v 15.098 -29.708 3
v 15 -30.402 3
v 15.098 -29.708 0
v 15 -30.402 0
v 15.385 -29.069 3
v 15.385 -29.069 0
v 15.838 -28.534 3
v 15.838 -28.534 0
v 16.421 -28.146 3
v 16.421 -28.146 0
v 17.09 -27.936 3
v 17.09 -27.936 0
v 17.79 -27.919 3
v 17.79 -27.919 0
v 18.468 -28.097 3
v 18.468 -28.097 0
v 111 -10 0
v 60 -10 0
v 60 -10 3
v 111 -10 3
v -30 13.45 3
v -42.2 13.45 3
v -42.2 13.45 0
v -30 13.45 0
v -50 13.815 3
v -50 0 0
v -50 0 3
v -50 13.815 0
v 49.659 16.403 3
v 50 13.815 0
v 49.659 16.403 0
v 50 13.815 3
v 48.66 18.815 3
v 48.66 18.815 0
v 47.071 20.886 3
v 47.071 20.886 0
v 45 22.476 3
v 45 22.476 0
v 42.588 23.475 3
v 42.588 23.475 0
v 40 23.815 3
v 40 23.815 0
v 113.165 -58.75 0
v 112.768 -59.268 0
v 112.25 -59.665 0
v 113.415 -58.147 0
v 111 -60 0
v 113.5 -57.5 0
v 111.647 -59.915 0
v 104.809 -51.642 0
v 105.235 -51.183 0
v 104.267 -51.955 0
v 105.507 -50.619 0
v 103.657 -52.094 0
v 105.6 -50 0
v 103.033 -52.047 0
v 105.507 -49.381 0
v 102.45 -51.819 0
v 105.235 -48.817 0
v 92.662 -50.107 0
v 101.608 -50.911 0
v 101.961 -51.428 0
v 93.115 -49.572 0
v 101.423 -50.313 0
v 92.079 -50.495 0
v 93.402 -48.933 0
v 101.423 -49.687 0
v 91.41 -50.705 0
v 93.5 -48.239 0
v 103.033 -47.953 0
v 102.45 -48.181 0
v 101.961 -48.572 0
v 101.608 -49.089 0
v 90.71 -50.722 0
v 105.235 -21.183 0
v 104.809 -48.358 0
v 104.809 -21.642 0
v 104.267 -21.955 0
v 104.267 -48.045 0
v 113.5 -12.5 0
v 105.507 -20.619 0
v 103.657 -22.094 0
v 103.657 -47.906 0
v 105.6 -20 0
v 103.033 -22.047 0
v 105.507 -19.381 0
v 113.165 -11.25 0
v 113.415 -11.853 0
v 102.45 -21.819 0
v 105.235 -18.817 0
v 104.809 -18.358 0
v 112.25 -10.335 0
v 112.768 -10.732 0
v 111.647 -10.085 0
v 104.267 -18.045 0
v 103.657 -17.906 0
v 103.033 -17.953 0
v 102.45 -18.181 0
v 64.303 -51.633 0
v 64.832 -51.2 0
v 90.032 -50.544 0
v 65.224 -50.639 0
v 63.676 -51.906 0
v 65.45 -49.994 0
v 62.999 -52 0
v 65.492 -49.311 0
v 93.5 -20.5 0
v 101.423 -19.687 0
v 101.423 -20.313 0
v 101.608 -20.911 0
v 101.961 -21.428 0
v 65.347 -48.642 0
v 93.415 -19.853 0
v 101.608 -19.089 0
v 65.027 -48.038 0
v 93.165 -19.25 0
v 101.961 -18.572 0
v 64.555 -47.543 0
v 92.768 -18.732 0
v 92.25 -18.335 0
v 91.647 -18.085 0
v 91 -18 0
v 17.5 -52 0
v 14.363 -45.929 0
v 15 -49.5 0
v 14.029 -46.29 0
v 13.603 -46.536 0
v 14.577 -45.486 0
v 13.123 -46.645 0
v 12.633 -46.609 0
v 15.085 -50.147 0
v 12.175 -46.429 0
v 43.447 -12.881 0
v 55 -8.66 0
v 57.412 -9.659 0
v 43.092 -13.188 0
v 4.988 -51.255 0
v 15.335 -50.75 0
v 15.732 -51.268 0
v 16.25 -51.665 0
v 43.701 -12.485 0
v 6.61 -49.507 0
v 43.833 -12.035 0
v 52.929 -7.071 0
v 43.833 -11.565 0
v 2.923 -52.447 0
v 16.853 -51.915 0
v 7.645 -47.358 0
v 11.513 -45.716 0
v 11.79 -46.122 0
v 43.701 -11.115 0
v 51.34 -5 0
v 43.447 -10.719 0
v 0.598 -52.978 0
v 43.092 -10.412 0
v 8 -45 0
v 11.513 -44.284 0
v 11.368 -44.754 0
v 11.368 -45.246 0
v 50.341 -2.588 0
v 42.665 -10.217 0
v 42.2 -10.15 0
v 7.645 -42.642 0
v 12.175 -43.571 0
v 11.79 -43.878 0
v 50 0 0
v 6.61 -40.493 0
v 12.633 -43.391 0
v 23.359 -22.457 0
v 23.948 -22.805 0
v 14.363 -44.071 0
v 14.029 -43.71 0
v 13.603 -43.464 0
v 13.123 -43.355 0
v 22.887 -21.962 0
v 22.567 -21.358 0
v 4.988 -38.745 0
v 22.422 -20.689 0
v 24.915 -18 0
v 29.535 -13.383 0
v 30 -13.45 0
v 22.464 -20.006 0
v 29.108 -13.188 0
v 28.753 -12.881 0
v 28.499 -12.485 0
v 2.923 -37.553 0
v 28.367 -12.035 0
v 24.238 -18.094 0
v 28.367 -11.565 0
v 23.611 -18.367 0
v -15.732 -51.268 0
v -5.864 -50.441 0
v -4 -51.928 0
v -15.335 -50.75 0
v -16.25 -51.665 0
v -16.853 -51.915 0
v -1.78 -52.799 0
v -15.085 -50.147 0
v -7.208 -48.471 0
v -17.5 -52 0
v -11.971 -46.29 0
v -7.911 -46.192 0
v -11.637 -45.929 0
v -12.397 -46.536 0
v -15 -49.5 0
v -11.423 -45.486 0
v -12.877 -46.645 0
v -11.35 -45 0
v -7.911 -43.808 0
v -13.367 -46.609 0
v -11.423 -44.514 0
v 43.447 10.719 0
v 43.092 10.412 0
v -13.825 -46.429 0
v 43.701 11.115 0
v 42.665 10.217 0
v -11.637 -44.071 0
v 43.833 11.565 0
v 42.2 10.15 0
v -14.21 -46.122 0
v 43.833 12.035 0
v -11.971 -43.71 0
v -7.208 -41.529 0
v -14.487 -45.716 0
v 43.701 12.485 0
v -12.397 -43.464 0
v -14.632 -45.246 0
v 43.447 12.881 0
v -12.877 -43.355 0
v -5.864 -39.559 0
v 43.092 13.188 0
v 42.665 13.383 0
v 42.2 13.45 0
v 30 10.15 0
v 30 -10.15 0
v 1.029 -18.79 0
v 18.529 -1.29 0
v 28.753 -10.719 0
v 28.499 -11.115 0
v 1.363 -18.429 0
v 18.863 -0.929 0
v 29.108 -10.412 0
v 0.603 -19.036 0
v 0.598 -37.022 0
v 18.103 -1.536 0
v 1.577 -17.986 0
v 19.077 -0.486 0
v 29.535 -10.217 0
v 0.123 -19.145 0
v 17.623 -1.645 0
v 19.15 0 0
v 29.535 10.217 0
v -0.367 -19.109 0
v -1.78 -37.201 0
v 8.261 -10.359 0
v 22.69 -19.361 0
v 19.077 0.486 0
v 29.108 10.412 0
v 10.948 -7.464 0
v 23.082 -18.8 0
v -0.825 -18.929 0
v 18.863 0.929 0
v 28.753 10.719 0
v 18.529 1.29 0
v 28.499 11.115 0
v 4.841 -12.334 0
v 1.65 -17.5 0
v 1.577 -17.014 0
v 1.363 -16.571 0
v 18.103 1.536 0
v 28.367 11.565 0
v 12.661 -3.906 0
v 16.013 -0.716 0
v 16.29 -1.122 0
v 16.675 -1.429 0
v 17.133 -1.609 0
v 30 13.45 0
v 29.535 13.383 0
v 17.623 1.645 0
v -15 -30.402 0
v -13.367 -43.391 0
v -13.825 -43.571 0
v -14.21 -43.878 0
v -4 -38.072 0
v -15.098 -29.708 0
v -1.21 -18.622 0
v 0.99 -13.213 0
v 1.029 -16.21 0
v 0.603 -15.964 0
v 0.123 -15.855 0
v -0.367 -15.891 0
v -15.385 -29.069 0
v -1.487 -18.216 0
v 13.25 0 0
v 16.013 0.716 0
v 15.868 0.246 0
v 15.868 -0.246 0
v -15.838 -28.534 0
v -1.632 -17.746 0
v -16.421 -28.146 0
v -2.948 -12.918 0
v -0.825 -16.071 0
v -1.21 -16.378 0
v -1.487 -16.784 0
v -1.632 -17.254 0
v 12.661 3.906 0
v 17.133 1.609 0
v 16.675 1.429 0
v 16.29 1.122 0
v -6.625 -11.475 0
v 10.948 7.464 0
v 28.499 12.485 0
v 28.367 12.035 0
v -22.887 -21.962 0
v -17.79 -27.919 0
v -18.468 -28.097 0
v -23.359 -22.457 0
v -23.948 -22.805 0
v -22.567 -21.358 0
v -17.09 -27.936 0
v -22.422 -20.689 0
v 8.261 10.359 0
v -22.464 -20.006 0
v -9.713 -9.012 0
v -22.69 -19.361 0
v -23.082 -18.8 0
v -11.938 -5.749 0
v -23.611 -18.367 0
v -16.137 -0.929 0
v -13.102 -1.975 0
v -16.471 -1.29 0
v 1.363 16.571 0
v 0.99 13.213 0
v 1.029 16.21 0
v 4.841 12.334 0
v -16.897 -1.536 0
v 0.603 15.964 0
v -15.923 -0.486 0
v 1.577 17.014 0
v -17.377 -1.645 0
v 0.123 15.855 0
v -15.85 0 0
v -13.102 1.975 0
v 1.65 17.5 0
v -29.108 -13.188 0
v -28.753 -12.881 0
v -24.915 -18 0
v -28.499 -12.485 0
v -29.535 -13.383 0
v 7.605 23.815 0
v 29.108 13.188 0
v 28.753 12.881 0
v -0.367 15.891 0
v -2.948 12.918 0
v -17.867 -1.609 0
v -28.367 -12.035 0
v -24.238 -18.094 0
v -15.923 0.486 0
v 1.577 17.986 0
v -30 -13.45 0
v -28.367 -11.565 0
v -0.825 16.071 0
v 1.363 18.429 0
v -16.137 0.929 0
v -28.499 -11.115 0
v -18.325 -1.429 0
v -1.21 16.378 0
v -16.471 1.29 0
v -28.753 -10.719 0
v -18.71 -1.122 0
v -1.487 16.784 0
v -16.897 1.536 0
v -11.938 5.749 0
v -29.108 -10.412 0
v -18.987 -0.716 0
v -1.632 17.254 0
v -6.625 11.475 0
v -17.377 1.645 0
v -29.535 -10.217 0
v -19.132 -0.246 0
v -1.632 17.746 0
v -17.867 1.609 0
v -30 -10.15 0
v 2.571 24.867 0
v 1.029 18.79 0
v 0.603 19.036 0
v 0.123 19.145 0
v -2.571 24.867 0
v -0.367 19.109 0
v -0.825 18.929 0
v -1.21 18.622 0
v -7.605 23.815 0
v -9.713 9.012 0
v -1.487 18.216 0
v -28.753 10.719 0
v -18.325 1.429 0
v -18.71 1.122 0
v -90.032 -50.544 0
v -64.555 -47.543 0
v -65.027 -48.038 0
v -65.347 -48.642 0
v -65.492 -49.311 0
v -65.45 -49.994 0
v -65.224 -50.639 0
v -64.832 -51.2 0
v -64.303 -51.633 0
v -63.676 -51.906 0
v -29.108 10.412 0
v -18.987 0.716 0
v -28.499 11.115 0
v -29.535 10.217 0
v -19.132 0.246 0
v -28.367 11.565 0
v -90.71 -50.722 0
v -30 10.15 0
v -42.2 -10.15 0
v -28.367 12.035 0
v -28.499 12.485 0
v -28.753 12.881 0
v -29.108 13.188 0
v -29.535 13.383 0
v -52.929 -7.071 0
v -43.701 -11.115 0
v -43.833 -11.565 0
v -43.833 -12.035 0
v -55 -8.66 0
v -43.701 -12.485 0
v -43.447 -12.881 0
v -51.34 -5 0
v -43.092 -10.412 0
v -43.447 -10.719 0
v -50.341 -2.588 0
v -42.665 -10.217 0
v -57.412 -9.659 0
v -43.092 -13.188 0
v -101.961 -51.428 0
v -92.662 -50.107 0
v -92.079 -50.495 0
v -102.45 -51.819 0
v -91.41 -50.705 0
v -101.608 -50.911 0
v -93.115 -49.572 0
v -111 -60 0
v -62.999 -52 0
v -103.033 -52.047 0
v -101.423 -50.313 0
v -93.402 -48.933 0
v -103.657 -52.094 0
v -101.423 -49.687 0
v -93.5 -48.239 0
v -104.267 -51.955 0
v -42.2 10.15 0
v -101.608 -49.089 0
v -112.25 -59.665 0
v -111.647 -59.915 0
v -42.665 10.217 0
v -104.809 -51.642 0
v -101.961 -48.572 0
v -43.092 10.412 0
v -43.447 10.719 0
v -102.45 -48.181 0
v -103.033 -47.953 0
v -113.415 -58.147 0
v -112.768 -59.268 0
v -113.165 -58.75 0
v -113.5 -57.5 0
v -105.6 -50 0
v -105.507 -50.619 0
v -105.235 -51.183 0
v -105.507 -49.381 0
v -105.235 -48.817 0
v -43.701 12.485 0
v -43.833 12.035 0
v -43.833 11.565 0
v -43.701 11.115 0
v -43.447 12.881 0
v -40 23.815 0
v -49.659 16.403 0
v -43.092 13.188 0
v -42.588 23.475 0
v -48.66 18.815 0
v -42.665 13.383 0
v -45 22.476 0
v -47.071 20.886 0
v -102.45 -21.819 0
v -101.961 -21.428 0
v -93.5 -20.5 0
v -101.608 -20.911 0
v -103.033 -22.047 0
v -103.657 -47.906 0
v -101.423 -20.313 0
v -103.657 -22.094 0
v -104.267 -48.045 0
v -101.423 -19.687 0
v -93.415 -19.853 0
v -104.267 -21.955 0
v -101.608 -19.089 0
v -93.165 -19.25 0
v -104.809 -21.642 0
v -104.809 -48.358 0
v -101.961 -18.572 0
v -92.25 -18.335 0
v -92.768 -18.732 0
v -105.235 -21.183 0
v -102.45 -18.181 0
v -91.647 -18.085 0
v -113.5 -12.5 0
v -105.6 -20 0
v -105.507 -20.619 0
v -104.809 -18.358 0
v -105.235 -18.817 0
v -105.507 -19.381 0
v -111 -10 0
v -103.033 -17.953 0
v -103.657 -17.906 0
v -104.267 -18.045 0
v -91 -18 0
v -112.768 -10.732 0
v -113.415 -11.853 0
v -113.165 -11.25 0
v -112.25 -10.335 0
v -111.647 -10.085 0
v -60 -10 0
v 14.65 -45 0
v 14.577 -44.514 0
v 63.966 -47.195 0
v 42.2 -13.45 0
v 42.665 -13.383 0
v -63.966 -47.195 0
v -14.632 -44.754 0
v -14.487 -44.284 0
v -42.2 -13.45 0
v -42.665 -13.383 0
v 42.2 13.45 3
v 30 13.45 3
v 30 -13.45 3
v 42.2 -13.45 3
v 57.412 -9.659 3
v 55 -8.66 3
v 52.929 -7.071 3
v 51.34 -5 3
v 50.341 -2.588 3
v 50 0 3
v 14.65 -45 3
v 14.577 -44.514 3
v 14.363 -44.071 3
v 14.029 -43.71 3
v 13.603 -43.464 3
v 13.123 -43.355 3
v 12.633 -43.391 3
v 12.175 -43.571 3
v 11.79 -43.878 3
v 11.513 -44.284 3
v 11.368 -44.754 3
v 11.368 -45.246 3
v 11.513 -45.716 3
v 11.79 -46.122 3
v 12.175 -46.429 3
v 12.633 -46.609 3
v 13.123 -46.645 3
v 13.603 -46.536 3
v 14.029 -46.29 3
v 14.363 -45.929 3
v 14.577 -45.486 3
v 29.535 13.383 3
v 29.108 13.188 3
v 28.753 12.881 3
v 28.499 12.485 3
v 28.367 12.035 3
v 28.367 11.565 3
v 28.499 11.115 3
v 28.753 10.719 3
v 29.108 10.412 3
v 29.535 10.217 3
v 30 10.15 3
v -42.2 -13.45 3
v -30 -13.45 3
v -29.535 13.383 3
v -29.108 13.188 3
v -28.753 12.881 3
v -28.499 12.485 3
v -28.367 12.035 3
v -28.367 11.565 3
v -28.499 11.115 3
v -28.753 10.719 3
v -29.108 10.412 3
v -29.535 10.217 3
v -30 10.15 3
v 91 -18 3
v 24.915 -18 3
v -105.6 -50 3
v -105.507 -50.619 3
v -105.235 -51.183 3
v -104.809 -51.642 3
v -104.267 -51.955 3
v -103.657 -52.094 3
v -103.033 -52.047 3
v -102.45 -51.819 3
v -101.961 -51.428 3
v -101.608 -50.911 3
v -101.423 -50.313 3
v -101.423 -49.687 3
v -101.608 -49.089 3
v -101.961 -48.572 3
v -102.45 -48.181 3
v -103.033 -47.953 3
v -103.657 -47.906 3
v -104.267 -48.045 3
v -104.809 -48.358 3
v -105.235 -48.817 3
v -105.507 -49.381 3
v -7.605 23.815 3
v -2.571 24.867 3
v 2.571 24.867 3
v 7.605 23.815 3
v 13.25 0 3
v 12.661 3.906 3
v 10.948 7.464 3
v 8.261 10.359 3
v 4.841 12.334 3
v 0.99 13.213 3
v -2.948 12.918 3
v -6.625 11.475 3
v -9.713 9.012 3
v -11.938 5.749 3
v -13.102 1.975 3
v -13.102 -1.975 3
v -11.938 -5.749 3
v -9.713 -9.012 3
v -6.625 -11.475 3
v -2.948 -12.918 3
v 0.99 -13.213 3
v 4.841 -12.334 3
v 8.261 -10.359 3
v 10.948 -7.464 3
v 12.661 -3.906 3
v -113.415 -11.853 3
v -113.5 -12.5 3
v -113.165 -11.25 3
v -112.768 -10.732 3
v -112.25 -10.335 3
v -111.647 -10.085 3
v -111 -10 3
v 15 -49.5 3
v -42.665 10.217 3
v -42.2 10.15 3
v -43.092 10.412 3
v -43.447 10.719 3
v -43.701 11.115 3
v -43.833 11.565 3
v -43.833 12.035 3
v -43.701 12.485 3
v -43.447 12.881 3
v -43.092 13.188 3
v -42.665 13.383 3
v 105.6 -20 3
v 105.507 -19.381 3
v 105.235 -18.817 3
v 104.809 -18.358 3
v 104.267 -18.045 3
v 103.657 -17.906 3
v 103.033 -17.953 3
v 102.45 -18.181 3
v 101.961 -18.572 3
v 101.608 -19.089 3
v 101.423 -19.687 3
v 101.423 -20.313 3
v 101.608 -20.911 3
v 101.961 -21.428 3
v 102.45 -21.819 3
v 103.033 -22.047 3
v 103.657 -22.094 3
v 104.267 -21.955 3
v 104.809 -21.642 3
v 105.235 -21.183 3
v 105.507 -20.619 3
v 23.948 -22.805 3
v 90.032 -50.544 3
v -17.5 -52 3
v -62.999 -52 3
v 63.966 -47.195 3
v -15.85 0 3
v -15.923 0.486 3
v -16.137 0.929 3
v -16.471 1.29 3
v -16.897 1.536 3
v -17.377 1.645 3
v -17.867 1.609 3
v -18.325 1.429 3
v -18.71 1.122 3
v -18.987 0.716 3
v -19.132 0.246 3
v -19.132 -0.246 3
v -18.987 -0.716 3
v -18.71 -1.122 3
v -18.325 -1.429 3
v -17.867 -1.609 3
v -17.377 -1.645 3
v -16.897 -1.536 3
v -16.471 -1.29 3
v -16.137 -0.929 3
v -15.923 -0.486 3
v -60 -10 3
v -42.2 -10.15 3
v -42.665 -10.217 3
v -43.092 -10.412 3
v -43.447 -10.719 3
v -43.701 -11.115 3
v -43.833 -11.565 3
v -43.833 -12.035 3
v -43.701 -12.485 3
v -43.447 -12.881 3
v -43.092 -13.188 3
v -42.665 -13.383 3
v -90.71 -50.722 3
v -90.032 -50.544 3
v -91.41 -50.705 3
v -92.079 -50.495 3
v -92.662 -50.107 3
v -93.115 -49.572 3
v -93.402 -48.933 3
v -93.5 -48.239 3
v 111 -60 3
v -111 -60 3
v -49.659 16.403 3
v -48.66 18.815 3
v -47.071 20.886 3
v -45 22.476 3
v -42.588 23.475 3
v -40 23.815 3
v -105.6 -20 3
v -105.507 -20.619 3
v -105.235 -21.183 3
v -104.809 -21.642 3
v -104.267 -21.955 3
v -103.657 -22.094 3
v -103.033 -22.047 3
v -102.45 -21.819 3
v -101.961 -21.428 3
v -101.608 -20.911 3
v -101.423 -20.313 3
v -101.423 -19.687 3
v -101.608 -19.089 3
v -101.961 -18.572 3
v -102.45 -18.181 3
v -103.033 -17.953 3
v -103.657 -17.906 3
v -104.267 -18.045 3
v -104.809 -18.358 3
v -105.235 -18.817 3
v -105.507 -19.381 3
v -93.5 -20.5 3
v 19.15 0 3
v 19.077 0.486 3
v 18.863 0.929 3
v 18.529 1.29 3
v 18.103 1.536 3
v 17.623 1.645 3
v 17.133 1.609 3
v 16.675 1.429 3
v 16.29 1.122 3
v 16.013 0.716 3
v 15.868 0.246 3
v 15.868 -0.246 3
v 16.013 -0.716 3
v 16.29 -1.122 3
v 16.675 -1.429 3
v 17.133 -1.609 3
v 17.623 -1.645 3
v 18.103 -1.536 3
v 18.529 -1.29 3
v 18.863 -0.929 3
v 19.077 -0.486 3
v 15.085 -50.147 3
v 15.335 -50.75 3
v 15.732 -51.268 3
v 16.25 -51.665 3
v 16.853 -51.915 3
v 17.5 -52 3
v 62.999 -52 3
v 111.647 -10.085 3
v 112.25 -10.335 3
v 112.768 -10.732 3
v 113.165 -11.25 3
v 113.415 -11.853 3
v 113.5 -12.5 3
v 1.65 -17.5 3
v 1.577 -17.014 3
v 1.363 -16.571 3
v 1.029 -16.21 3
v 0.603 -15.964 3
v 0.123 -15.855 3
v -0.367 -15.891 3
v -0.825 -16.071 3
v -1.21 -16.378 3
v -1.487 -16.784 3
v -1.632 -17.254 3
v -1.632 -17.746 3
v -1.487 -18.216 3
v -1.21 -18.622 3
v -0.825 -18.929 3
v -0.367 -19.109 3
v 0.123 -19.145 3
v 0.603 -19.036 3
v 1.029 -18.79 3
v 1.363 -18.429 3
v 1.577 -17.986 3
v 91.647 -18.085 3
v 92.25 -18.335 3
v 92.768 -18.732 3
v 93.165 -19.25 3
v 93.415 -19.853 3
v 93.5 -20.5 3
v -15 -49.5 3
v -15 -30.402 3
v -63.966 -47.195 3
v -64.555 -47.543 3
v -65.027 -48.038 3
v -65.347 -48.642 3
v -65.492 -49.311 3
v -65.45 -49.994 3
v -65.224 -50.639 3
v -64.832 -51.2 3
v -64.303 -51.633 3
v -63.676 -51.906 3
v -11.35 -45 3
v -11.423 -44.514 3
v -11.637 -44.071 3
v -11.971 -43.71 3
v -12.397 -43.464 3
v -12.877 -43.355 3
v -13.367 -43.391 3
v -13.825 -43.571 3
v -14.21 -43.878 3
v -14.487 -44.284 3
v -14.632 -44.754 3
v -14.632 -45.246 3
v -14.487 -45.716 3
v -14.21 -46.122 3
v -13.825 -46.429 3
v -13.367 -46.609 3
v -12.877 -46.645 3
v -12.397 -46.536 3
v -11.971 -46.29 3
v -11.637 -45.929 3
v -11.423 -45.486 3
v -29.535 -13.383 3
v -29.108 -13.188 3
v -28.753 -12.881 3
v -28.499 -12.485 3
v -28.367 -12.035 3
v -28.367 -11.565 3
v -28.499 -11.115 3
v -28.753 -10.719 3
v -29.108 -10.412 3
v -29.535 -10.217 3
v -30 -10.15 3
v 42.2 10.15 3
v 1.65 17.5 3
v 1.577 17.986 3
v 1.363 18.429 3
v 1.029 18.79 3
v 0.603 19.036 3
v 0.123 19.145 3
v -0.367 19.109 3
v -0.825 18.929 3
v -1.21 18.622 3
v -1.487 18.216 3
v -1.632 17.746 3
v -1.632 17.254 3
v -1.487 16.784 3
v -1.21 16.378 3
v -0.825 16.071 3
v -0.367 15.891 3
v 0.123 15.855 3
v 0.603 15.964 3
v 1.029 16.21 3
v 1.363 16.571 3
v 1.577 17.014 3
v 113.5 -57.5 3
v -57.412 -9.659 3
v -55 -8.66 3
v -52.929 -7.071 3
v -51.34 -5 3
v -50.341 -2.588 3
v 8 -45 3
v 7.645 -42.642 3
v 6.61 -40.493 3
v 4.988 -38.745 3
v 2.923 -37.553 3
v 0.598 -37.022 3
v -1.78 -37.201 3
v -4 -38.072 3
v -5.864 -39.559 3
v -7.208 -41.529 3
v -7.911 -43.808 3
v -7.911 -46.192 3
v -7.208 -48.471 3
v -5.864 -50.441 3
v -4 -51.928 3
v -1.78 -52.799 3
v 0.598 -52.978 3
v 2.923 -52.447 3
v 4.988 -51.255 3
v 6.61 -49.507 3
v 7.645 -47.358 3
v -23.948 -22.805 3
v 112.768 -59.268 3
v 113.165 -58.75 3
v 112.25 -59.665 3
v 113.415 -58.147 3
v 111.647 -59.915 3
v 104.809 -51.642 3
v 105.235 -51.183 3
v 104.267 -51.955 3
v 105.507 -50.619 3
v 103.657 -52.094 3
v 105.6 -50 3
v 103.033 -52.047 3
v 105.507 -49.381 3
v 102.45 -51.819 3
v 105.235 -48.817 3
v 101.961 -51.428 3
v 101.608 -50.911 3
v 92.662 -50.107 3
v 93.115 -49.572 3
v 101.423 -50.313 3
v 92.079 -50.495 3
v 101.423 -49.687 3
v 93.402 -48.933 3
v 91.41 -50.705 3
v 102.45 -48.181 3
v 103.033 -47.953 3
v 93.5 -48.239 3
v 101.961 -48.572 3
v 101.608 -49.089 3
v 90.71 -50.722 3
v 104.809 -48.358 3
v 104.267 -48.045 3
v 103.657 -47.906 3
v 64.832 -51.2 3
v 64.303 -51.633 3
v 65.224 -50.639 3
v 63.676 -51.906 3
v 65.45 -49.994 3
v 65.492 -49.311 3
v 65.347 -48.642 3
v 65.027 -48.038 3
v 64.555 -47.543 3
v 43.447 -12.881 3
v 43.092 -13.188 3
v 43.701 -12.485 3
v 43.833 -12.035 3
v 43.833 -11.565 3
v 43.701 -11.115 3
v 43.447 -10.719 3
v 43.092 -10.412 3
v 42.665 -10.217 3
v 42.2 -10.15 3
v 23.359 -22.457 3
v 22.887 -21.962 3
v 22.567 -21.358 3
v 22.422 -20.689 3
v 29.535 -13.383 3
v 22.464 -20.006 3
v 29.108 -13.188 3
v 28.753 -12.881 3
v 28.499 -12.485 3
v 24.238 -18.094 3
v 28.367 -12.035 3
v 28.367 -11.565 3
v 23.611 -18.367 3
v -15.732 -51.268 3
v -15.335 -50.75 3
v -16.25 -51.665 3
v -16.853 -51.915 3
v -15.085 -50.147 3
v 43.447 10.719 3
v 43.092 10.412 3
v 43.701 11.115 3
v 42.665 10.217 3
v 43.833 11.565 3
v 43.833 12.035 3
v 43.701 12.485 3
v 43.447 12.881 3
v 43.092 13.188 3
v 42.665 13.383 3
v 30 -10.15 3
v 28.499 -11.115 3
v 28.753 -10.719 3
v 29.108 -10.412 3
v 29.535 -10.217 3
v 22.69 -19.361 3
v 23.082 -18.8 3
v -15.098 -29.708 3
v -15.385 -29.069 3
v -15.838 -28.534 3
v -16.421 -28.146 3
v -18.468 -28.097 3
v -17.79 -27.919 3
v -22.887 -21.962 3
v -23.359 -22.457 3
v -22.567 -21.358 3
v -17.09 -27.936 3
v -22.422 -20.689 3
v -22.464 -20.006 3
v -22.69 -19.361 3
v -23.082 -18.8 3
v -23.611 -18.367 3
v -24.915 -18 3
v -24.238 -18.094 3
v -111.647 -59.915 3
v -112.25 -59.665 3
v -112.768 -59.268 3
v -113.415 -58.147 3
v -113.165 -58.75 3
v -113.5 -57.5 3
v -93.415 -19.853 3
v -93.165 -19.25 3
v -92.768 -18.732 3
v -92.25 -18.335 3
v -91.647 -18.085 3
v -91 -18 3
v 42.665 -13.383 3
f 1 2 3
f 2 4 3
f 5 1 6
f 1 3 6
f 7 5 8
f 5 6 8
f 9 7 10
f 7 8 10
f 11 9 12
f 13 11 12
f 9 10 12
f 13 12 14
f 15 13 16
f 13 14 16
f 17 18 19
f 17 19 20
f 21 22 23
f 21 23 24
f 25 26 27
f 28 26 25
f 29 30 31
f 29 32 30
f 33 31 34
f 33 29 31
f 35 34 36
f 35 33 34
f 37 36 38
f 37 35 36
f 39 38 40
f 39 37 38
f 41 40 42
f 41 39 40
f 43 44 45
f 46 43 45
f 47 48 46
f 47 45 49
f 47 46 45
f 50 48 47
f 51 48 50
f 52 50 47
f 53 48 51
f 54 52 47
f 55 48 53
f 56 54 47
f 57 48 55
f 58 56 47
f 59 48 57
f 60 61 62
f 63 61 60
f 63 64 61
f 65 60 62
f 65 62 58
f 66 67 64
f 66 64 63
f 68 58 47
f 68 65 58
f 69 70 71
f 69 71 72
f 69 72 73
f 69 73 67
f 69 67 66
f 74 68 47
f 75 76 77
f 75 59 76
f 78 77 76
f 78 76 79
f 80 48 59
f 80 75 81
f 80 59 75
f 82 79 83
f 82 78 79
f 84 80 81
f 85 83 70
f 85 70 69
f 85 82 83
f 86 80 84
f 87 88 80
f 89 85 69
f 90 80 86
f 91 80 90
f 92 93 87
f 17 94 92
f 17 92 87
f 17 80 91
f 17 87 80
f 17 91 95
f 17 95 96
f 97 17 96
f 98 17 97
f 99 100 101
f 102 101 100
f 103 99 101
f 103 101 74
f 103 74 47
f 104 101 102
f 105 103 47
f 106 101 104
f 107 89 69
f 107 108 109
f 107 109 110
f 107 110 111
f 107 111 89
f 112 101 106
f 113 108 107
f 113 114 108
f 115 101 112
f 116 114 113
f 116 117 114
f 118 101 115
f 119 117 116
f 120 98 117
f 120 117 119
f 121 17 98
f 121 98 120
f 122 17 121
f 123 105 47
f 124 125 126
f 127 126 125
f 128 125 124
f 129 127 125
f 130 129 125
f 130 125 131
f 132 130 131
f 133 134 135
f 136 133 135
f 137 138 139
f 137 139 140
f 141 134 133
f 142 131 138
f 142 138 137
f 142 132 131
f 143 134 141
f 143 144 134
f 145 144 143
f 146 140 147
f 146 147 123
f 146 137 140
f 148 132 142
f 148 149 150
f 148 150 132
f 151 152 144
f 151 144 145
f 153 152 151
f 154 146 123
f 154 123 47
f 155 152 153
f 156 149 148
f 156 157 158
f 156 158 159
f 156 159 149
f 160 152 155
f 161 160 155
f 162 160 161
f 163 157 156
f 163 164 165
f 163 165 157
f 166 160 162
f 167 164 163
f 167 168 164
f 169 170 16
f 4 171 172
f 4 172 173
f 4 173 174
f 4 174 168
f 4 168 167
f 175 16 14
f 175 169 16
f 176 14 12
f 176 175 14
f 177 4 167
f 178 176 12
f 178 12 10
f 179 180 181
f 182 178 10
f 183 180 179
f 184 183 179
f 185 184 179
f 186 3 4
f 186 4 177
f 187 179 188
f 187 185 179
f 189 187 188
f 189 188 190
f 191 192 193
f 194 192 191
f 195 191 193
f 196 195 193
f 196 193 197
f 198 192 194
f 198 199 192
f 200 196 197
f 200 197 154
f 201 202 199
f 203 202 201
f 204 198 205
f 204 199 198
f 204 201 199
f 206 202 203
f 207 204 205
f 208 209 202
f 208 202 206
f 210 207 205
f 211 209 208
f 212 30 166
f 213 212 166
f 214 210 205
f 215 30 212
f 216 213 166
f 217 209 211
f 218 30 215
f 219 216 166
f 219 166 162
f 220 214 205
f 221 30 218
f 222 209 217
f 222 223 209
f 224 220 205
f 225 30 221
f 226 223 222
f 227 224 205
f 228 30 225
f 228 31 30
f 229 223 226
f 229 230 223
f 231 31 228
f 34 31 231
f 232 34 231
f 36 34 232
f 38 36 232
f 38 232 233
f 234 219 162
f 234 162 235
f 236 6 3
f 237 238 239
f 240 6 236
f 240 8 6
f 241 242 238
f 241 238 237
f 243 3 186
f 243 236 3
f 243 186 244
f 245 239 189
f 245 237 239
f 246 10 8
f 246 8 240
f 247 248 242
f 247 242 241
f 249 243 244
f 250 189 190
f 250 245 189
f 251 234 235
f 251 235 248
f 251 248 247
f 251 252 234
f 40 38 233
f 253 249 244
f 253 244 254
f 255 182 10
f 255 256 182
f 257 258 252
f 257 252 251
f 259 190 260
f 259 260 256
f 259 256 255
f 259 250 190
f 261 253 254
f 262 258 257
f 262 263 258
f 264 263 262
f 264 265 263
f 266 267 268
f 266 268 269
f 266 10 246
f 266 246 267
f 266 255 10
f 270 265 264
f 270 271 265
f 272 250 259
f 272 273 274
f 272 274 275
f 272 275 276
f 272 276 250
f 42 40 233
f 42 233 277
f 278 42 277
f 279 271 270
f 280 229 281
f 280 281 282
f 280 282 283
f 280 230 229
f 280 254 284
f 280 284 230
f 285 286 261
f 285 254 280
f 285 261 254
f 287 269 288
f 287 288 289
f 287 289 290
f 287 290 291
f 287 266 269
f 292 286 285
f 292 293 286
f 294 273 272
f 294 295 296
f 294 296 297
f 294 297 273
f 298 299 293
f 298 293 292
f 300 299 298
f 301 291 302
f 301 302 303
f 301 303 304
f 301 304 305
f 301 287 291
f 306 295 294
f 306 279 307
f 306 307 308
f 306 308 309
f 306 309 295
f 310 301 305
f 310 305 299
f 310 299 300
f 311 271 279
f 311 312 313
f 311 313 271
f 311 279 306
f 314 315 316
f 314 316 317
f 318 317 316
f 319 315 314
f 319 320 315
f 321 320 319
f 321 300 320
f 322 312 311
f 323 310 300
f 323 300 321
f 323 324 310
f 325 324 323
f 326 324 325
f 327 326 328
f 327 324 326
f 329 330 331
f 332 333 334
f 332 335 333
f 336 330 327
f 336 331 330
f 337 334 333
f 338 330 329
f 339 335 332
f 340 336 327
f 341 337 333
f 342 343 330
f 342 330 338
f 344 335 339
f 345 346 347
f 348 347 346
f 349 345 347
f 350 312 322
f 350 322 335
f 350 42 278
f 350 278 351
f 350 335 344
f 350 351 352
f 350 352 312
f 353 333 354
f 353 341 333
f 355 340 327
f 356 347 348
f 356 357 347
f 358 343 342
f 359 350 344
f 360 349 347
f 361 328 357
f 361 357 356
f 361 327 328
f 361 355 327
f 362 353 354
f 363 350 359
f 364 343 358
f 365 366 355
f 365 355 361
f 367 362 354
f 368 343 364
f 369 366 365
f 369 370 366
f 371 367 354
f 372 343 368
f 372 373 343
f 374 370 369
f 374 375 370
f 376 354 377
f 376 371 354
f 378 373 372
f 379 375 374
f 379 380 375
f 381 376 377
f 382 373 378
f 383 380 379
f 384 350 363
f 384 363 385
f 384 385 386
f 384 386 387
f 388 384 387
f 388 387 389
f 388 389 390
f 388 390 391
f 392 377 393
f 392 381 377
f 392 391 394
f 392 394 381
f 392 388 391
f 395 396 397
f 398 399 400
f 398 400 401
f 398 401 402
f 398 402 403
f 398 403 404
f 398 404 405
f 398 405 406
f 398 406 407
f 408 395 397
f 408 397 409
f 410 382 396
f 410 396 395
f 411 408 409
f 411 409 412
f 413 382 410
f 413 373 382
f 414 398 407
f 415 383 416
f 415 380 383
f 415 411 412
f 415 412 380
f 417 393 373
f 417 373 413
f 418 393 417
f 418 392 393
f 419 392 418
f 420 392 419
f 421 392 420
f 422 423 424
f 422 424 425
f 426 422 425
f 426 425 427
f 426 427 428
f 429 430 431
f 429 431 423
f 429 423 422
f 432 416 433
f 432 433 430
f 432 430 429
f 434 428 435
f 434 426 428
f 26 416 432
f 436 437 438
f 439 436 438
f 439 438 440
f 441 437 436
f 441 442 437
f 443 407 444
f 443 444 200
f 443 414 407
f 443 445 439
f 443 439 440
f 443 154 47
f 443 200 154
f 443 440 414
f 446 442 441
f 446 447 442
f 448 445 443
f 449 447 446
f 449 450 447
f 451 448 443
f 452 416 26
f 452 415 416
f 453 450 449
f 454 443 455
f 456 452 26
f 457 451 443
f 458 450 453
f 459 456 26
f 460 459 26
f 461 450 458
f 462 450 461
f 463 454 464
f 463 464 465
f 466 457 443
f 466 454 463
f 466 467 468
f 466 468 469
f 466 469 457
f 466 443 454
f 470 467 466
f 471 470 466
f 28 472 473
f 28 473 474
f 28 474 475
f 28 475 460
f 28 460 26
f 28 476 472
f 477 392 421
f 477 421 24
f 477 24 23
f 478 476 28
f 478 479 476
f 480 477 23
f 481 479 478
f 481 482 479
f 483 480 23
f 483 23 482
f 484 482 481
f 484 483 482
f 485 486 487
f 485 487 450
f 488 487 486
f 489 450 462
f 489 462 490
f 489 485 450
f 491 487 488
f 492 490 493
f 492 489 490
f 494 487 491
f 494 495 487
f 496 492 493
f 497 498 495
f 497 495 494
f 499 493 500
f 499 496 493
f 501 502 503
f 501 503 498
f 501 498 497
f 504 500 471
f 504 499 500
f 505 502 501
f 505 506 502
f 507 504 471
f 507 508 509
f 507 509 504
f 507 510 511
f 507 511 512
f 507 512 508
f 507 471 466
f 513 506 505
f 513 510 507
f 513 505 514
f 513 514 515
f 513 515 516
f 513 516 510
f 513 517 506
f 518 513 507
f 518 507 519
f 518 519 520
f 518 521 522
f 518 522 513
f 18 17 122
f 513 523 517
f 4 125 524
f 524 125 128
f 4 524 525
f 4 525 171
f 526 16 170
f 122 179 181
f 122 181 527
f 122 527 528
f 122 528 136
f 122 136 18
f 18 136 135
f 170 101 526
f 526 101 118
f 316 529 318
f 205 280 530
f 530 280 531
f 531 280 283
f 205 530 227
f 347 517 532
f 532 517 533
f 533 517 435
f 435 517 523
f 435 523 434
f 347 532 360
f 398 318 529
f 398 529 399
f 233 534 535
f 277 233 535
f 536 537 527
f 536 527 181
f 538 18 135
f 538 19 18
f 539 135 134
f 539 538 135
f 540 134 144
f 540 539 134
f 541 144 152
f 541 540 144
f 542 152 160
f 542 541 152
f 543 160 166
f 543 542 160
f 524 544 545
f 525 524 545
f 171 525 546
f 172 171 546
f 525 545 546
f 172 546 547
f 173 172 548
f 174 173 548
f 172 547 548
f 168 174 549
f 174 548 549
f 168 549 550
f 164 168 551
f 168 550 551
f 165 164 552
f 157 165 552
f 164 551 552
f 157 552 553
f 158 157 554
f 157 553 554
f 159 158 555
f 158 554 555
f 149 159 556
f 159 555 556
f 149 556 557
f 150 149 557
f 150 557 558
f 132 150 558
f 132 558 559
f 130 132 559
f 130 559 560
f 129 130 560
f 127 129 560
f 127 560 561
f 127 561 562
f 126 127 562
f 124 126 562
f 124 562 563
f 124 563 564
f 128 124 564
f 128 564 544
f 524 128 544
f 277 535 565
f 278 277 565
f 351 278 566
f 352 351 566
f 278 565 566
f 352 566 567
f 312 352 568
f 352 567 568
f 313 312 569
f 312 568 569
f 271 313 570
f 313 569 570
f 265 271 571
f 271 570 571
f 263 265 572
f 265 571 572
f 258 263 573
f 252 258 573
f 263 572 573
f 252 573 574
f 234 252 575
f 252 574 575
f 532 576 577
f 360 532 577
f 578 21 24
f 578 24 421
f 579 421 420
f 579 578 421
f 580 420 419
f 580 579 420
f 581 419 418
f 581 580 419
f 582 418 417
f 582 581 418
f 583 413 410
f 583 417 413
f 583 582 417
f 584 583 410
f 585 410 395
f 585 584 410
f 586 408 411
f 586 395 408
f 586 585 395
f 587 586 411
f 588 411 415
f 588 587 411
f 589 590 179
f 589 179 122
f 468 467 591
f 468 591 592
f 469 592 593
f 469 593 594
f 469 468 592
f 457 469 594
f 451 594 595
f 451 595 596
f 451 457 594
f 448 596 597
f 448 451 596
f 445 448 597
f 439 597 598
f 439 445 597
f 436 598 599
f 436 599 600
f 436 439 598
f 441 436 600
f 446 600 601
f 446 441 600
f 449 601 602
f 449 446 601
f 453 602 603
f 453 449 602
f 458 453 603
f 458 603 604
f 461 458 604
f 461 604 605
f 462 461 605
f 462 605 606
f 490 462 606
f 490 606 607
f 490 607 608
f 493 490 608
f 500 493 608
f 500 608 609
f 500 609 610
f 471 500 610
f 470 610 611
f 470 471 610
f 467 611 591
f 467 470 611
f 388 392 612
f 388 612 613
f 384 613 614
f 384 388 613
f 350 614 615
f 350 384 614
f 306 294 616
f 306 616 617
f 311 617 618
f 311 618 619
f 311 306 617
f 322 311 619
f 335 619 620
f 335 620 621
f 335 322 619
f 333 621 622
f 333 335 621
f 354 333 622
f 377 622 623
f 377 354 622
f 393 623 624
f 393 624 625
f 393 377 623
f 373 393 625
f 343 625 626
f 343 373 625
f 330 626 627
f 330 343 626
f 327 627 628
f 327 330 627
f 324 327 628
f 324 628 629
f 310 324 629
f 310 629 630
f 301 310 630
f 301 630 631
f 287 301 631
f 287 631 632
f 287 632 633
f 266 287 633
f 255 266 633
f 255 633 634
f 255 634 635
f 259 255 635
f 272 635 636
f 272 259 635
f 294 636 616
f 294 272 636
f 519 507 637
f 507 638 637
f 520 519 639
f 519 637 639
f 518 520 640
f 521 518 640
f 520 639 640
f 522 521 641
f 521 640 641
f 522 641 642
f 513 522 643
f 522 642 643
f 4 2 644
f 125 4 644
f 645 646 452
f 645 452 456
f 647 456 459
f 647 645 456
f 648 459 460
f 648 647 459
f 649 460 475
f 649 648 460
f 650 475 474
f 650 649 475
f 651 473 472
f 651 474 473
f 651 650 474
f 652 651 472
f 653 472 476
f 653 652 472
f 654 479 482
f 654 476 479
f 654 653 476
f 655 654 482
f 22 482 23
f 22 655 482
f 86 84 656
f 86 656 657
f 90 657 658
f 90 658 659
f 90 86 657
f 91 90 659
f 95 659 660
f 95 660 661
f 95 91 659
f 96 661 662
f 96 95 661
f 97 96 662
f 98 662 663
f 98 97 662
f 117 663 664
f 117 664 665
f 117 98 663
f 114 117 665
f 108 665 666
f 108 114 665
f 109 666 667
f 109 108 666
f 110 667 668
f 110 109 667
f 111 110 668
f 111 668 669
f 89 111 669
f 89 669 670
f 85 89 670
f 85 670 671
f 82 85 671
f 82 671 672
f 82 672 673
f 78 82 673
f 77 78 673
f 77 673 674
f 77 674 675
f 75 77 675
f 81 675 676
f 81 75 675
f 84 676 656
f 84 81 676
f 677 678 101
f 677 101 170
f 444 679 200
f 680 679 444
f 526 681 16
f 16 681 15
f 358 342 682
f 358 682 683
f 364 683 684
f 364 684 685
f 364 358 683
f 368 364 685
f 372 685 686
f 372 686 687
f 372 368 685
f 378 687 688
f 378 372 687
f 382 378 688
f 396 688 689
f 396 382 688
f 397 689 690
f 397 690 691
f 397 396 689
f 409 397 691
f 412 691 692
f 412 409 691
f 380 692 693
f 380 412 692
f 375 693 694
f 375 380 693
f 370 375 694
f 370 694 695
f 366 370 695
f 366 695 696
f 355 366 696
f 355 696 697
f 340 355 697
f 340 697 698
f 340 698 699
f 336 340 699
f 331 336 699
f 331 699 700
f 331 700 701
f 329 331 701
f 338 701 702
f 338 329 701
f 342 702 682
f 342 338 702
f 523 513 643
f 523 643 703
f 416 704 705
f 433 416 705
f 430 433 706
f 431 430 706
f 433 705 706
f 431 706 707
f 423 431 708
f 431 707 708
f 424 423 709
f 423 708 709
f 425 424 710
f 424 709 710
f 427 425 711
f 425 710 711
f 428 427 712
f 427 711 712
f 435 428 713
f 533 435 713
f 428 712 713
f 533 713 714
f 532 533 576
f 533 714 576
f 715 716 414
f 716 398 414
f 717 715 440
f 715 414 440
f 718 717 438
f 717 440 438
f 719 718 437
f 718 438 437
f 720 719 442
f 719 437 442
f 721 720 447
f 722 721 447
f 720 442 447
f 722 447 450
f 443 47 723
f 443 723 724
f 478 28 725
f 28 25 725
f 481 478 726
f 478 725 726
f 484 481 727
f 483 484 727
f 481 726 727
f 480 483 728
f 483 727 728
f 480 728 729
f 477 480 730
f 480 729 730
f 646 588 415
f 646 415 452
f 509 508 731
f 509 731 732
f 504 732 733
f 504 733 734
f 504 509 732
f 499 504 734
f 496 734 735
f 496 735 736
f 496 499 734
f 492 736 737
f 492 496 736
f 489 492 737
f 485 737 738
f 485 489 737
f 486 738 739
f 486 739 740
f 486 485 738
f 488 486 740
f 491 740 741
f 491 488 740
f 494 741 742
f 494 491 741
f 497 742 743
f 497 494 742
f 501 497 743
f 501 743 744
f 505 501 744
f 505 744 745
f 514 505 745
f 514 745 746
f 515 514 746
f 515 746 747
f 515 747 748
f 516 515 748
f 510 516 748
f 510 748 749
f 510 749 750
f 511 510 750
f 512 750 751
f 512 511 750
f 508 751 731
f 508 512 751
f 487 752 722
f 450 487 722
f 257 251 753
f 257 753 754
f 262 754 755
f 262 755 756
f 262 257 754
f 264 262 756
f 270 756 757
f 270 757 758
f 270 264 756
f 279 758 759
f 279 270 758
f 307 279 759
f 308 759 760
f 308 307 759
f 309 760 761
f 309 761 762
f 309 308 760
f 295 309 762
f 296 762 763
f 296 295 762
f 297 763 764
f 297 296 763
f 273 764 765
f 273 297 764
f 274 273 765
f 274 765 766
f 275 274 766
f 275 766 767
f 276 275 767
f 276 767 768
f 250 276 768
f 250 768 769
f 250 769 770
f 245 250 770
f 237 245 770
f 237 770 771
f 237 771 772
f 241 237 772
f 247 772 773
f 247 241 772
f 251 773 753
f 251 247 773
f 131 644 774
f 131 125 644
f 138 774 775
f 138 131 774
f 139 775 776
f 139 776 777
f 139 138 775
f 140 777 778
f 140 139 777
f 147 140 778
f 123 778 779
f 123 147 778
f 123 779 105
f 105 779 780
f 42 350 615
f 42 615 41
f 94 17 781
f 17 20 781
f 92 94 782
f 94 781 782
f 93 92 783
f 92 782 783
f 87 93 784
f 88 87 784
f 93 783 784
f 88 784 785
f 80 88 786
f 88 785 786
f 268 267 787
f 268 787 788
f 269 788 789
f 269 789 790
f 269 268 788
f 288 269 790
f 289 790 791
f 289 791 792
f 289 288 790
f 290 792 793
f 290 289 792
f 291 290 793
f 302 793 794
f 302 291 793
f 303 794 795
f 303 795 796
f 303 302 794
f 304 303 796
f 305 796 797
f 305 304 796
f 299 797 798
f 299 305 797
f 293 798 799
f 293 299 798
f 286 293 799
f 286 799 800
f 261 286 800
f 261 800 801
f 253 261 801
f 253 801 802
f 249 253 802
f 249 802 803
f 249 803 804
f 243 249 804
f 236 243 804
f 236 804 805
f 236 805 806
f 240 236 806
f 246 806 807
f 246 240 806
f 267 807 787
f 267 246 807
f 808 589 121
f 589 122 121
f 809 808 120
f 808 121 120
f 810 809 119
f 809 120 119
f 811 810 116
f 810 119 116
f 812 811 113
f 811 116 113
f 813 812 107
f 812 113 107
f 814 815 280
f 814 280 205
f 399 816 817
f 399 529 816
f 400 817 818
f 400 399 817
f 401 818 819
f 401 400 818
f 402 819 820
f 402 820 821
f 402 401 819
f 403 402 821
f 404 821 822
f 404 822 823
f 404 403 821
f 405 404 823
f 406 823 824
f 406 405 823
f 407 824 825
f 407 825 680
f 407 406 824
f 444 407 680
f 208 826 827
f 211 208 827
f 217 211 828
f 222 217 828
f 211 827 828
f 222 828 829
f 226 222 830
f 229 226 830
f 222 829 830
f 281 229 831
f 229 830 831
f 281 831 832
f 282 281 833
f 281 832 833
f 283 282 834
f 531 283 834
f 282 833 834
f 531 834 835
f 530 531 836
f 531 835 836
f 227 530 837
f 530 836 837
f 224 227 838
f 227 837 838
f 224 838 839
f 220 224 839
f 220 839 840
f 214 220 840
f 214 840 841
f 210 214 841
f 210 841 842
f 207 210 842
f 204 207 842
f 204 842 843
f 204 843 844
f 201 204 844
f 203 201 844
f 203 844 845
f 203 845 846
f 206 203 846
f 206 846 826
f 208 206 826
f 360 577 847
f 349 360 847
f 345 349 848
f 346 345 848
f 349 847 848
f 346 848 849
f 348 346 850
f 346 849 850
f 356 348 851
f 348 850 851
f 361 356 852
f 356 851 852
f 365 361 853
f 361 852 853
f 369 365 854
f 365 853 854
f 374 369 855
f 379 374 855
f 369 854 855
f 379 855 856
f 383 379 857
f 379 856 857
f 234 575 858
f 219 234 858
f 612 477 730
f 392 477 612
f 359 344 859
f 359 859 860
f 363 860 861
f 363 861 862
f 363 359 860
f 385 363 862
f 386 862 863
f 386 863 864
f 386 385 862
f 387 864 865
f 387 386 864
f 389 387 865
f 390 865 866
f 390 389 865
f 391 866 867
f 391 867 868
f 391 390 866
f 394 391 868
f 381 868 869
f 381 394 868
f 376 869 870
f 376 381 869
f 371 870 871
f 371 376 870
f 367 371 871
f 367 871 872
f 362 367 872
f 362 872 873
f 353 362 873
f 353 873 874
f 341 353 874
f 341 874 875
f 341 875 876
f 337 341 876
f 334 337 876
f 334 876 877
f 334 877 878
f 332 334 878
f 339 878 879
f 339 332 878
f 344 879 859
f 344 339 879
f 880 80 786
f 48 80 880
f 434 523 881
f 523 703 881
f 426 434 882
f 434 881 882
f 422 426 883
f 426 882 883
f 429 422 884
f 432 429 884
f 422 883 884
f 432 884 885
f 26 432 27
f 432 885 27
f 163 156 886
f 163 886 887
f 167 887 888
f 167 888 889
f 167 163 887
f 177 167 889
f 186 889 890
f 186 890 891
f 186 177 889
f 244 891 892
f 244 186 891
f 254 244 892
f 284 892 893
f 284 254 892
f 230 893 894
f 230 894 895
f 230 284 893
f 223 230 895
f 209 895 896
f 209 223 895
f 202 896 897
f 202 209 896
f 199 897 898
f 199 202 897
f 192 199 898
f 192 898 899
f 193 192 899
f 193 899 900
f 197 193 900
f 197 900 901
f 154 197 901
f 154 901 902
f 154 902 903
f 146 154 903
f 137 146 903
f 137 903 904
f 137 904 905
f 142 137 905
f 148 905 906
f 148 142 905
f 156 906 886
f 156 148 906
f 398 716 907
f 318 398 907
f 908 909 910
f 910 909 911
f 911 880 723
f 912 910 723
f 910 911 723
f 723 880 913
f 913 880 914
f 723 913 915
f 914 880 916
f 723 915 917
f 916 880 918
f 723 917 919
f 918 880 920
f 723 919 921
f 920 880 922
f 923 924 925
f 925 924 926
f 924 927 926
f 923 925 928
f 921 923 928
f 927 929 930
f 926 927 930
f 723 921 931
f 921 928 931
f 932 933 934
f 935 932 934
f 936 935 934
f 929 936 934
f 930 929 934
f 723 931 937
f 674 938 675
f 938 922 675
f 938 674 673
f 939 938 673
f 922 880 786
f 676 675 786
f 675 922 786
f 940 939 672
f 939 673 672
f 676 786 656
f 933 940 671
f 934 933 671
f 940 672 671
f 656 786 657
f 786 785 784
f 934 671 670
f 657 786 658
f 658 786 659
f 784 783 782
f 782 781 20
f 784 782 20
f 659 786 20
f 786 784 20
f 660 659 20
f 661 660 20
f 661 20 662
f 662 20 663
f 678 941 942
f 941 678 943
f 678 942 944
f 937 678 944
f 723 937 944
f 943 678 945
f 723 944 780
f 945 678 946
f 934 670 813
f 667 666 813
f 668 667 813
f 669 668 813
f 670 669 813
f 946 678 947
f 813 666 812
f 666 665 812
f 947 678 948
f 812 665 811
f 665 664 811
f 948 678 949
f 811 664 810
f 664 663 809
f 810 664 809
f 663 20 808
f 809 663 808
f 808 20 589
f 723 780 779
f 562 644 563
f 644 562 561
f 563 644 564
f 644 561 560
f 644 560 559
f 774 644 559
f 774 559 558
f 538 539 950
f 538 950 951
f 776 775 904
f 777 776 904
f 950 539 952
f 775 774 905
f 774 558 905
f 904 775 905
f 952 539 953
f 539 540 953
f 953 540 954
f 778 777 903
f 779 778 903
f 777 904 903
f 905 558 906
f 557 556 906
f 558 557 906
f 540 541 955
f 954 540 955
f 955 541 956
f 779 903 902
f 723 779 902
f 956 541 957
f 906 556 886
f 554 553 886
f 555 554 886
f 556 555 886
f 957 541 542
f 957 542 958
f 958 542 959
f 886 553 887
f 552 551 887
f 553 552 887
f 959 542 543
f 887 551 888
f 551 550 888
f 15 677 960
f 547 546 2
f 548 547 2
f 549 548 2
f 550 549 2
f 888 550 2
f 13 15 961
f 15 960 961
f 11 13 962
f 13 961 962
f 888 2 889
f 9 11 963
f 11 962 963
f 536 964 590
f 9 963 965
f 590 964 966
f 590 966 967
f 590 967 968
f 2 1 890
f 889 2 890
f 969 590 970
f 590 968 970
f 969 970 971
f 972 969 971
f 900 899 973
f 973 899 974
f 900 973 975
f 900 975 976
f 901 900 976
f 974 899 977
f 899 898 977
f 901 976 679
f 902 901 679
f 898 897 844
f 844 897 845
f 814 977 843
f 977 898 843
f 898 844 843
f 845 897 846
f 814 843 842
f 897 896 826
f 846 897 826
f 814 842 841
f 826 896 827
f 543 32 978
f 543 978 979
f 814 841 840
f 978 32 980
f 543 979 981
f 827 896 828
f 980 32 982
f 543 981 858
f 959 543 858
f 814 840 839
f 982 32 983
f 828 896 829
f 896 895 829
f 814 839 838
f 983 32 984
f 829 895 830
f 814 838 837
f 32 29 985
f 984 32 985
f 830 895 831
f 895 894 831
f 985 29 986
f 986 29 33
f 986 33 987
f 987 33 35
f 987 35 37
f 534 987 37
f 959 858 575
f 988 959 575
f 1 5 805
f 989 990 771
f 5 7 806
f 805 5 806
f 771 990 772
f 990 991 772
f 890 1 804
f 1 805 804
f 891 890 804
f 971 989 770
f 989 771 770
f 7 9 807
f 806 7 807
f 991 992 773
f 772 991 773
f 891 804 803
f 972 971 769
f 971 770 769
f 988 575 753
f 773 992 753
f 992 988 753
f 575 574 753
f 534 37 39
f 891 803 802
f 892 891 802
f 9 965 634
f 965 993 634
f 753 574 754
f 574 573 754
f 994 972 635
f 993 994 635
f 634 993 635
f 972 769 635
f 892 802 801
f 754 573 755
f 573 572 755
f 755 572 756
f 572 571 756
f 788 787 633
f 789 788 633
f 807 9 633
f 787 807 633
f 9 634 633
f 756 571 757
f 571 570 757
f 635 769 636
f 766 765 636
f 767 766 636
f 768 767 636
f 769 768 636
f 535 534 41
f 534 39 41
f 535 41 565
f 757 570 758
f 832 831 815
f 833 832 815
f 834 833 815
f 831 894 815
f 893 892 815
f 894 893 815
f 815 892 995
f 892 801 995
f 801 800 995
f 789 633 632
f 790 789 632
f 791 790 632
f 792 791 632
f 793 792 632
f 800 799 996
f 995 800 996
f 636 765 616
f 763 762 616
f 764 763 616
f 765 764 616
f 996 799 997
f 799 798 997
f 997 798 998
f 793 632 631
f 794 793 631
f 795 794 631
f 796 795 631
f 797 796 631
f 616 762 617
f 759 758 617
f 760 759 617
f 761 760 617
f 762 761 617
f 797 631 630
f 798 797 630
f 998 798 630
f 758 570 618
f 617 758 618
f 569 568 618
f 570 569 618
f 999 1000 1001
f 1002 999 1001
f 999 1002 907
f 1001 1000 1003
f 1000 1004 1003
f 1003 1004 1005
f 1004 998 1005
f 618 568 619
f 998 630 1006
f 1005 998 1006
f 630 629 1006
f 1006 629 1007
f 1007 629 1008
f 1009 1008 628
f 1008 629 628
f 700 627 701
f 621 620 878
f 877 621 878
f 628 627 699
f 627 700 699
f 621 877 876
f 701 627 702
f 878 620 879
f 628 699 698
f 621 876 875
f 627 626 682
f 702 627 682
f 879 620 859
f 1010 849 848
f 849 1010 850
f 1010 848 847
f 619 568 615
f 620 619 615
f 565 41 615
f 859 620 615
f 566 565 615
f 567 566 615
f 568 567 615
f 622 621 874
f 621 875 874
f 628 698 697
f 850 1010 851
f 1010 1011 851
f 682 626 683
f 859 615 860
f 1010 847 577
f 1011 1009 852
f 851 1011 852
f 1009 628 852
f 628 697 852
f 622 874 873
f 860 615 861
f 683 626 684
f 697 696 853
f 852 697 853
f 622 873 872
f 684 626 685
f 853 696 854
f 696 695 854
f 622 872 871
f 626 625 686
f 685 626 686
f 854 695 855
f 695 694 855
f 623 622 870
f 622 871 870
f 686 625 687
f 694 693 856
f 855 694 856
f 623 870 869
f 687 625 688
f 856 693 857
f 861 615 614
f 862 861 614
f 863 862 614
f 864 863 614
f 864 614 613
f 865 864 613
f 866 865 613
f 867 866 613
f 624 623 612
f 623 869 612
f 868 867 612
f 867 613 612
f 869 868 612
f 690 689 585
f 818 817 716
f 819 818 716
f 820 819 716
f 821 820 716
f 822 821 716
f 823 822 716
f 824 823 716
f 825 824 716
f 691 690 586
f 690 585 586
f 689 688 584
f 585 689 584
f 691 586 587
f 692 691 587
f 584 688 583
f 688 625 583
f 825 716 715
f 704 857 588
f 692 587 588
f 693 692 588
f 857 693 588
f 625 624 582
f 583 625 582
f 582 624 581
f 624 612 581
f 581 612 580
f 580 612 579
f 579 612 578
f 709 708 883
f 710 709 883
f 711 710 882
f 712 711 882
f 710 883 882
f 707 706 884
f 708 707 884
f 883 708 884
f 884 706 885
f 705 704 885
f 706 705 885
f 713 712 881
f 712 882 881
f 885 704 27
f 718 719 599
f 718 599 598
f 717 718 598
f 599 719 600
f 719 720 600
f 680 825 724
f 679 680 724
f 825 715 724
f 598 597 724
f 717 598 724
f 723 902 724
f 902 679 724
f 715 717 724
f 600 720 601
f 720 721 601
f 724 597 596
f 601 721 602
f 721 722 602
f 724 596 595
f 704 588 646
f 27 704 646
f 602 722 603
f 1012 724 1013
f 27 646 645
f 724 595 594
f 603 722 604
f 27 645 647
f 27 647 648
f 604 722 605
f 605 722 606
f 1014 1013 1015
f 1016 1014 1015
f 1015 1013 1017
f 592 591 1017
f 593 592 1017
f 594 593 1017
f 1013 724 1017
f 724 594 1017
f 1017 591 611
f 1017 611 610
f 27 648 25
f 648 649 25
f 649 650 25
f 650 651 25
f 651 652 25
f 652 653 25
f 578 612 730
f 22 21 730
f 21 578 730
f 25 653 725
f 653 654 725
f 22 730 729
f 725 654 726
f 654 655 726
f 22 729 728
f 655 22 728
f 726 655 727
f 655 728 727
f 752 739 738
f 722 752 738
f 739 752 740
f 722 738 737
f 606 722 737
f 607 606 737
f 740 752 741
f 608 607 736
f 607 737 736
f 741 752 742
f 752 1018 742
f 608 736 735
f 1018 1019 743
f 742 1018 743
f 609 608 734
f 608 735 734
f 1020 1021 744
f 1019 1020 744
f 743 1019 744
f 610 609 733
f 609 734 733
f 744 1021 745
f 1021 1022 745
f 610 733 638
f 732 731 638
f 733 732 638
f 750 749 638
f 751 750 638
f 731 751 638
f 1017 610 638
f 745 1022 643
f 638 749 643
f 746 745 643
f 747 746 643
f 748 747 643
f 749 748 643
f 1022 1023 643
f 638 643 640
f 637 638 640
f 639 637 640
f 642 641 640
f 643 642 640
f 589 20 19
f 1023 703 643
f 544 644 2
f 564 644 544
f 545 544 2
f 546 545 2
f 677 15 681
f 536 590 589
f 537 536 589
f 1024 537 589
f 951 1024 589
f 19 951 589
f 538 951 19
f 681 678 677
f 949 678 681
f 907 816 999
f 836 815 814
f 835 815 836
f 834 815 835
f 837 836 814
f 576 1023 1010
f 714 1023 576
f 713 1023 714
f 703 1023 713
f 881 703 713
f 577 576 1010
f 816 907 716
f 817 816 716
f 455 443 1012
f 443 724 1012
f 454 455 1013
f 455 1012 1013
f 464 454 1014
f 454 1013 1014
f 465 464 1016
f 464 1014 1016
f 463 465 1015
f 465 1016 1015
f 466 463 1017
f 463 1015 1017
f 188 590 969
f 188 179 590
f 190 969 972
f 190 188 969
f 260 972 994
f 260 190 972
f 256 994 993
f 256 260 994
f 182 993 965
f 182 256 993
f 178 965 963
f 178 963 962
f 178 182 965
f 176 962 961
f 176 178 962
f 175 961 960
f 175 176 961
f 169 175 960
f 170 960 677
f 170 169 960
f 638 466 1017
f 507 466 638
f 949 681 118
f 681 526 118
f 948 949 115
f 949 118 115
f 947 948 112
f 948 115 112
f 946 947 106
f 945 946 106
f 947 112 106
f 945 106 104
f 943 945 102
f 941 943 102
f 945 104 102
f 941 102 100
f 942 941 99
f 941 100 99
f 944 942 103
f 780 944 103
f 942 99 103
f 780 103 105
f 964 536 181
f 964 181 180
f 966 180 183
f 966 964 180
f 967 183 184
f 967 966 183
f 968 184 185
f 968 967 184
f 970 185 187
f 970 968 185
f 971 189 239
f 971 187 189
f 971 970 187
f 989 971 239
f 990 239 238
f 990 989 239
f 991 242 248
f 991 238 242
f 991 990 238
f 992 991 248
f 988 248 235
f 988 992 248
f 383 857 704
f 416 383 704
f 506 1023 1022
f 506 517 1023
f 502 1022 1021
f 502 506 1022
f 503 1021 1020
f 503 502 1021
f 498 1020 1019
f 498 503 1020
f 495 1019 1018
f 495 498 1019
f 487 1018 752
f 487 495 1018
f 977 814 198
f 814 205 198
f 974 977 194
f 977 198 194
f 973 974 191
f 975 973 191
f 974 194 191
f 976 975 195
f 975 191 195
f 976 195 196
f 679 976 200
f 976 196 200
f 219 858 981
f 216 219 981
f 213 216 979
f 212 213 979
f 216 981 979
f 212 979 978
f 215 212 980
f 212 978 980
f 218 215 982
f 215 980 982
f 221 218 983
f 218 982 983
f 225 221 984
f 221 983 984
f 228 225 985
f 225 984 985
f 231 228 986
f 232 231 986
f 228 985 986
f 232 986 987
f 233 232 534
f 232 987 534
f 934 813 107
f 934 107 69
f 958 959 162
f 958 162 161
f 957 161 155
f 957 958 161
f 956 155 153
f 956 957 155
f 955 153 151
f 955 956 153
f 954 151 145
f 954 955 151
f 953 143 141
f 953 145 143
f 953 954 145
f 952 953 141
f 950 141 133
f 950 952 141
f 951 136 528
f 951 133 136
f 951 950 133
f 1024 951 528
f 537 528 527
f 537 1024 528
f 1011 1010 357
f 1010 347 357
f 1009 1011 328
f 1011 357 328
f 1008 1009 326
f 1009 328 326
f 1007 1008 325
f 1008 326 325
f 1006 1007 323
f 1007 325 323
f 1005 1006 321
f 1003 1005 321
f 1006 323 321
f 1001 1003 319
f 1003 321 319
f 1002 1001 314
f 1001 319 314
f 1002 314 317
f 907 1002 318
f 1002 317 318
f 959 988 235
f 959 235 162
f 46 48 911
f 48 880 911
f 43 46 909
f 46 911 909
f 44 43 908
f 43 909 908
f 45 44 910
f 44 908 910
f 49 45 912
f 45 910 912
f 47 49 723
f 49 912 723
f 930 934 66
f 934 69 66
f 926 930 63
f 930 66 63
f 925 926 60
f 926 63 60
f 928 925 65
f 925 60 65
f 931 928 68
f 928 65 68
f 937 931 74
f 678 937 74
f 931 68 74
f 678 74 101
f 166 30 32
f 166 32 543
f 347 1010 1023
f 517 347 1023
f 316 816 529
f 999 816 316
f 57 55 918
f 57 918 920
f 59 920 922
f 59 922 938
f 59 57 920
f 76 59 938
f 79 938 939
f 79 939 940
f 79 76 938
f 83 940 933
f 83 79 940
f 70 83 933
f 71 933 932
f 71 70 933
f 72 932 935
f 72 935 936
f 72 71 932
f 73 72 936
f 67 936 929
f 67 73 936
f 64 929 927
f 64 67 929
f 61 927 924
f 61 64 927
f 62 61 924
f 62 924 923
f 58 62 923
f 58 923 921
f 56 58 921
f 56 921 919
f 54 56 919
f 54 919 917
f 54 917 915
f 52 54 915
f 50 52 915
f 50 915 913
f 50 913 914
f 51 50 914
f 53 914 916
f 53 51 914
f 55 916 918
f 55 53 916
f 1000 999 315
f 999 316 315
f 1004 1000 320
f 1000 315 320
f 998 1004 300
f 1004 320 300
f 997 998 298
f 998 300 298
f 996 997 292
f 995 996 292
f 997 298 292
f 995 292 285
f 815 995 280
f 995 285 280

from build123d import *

# Parameters (mm, degrees)
SKETCH_1_R          = 13.25
SKETCH_1_R_2        = 1.65
SKETCH_1_R_3        = 2.1
SKETCH_1_R_4        = 8
EXTRUDE_1_DEPTH     = 3
FILLET_1_R          = 10
CUT_EXTRUDE_1_DEPTH = 3
FILLET_3_R          = 2.5
SKETCH_3_R          = 1.65
CUT_EXTRUDE_2_DEPTH = 129.418261941
CUT_EXTRUDE_3_DEPTH = 129.418261941


with BuildPart() as part:
    # 草图1 → 凸台-拉伸1 (new body)
    with BuildSketch(Plane.XY):
        with BuildLine():
            Line((113.5, -10), (113.5, -60))
            Line((113.5, -60), (-113.5, -60))
            Line((-113.5, -60), (-113.5, -10))
            Line((-113.5, -10), (-50, -10))
            Line((-50, -10), (-50, 23.815246989))
            Line((-50, 23.815246989), (-7.604867576, 23.815246989))
            ThreePointArc((-7.604867576, 23.815246989), (0, 25), (7.604867576, 23.815246989))
            Line((7.604867576, 23.815246989), (50, 23.815246989))
            Line((50, 23.815246989), (50, -10))
            Line((50, -10), (113.5, -10))
        make_face()
        Circle(SKETCH_1_R, mode=Mode.SUBTRACT)
        with Locations((0, 17.5)):
            Circle(SKETCH_1_R_2, mode=Mode.SUBTRACT)
        with Locations((-17.5, 0)):
            Circle(SKETCH_1_R_2, mode=Mode.SUBTRACT)
        with Locations((0, -17.5)):
            Circle(SKETCH_1_R_2, mode=Mode.SUBTRACT)
        with Locations((17.5, 0)):
            Circle(SKETCH_1_R_2, mode=Mode.SUBTRACT)
        with Locations((103.5, -20)):
            Circle(SKETCH_1_R_3, mode=Mode.SUBTRACT)
        with Locations((103.5, -50)):
            Circle(SKETCH_1_R_3, mode=Mode.SUBTRACT)
        with Locations((0, -45)):
            Circle(SKETCH_1_R_4, mode=Mode.SUBTRACT)
        with Locations(Location((-103.5, -50, 0), (0, 0, 180))):
            Circle(SKETCH_1_R_3, mode=Mode.SUBTRACT)
        with Locations(Location((-103.5, -20, 0), (0, 0, 180))):
            Circle(SKETCH_1_R_3, mode=Mode.SUBTRACT)
    extrude(amount=EXTRUDE_1_DEPTH)

    # 圆角1
    fillet_1_edges = [part.edges().sort_by_distance(p)[0] for p in [
        (50, 23.815246989, 1.5),
        (50, -10, 1.5),
        (-50, -10, 1.5),
        (-50, 23.815246989, 1.5),
    ]]
    fillet(fillet_1_edges, radius=FILLET_1_R)

    # 草图2 → 切除-拉伸1 (cut)
    with BuildSketch(Plane.XY.offset(3)):
        Polygon((-93.5, -18), (-93.5, -52), (-12.5, -18), align=None)
        Polygon((12.5, -18), (93.5, -18), (93.5, -52), align=None)
        Polygon((-75.413964744, -52), (-15, -26.641051836), (-15, -52), align=None)
        Polygon((15, -52), (75.413964744, -52), (15, -26.641051836), align=None)
    extrude(amount=-CUT_EXTRUDE_1_DEPTH, mode=Mode.SUBTRACT)

    # 圆角3
    fillet_3_edges = [part.edges().sort_by_distance(p)[0] for p in [
        (-15, -52, 1.5),
        (-75.413964744, -52, 1.5),
        (-15, -26.641051836, 1.5),
        (15, -52, 1.5),
        (15, -26.641051836, 1.5),
        (75.413964744, -52, 1.5),
        (93.5, -52, 1.5),
        (12.5, -18, 1.5),
        (93.5, -18, 1.5),
        (-93.5, -18, 1.5),
        (-12.5, -18, 1.5),
        (-93.5, -52, 1.5),
        (113.5, -10, 1.5),
        (113.5, -60, 1.5),
        (-113.5, -60, 1.5),
        (-113.5, -10, 1.5),
    ]]
    fillet(fillet_3_edges, radius=FILLET_3_R)

    # 草图3 → 切除-拉伸2 (cut, through all)
    with BuildSketch(Plane.XY.offset(3)):
        with Locations((-13, -45)):
            Circle(SKETCH_3_R)
        with Locations((13, -45)):
            Circle(SKETCH_3_R)
    extrude(amount=-CUT_EXTRUDE_2_DEPTH, mode=Mode.SUBTRACT)

    # 草图4 → 切除-拉伸3 (cut, through all)
    with BuildSketch(Plane.XY.offset(3)):
        with BuildLine():
            Line((-42.2, 13.45), (-30, 13.45))
            ThreePointArc((-30, 13.45), (-28.35, 11.8), (-30, 10.15))
            Line((-30, 10.15), (-42.2, 10.15))
            ThreePointArc((-42.2, 10.15), (-43.85, 11.8), (-42.2, 13.45))
        make_face()
        with BuildLine():
            Line((-42.2, -13.45), (-30, -13.45))
            ThreePointArc((-30, -13.45), (-28.35, -11.8), (-30, -10.15))
            Line((-30, -10.15), (-42.2, -10.15))
            ThreePointArc((-42.2, -10.15), (-43.85, -11.8), (-42.2, -13.45))
        make_face()
        with BuildLine():
            Line((42.2, 13.45), (30, 13.45))
            ThreePointArc((30, 13.45), (28.35, 11.8), (30, 10.15))
            Line((30, 10.15), (42.2, 10.15))
            ThreePointArc((42.2, 10.15), (43.85, 11.8), (42.2, 13.45))
        make_face()
        with BuildLine():
            Line((42.2, -13.45), (30, -13.45))
            ThreePointArc((30, -13.45), (28.35, -11.8), (30, -10.15))
            Line((30, -10.15), (42.2, -10.15))
            ThreePointArc((42.2, -10.15), (43.85, -11.8), (42.2, -13.45))
        make_face()
    extrude(amount=-CUT_EXTRUDE_3_DEPTH, mode=Mode.SUBTRACT)


solid = part.part
